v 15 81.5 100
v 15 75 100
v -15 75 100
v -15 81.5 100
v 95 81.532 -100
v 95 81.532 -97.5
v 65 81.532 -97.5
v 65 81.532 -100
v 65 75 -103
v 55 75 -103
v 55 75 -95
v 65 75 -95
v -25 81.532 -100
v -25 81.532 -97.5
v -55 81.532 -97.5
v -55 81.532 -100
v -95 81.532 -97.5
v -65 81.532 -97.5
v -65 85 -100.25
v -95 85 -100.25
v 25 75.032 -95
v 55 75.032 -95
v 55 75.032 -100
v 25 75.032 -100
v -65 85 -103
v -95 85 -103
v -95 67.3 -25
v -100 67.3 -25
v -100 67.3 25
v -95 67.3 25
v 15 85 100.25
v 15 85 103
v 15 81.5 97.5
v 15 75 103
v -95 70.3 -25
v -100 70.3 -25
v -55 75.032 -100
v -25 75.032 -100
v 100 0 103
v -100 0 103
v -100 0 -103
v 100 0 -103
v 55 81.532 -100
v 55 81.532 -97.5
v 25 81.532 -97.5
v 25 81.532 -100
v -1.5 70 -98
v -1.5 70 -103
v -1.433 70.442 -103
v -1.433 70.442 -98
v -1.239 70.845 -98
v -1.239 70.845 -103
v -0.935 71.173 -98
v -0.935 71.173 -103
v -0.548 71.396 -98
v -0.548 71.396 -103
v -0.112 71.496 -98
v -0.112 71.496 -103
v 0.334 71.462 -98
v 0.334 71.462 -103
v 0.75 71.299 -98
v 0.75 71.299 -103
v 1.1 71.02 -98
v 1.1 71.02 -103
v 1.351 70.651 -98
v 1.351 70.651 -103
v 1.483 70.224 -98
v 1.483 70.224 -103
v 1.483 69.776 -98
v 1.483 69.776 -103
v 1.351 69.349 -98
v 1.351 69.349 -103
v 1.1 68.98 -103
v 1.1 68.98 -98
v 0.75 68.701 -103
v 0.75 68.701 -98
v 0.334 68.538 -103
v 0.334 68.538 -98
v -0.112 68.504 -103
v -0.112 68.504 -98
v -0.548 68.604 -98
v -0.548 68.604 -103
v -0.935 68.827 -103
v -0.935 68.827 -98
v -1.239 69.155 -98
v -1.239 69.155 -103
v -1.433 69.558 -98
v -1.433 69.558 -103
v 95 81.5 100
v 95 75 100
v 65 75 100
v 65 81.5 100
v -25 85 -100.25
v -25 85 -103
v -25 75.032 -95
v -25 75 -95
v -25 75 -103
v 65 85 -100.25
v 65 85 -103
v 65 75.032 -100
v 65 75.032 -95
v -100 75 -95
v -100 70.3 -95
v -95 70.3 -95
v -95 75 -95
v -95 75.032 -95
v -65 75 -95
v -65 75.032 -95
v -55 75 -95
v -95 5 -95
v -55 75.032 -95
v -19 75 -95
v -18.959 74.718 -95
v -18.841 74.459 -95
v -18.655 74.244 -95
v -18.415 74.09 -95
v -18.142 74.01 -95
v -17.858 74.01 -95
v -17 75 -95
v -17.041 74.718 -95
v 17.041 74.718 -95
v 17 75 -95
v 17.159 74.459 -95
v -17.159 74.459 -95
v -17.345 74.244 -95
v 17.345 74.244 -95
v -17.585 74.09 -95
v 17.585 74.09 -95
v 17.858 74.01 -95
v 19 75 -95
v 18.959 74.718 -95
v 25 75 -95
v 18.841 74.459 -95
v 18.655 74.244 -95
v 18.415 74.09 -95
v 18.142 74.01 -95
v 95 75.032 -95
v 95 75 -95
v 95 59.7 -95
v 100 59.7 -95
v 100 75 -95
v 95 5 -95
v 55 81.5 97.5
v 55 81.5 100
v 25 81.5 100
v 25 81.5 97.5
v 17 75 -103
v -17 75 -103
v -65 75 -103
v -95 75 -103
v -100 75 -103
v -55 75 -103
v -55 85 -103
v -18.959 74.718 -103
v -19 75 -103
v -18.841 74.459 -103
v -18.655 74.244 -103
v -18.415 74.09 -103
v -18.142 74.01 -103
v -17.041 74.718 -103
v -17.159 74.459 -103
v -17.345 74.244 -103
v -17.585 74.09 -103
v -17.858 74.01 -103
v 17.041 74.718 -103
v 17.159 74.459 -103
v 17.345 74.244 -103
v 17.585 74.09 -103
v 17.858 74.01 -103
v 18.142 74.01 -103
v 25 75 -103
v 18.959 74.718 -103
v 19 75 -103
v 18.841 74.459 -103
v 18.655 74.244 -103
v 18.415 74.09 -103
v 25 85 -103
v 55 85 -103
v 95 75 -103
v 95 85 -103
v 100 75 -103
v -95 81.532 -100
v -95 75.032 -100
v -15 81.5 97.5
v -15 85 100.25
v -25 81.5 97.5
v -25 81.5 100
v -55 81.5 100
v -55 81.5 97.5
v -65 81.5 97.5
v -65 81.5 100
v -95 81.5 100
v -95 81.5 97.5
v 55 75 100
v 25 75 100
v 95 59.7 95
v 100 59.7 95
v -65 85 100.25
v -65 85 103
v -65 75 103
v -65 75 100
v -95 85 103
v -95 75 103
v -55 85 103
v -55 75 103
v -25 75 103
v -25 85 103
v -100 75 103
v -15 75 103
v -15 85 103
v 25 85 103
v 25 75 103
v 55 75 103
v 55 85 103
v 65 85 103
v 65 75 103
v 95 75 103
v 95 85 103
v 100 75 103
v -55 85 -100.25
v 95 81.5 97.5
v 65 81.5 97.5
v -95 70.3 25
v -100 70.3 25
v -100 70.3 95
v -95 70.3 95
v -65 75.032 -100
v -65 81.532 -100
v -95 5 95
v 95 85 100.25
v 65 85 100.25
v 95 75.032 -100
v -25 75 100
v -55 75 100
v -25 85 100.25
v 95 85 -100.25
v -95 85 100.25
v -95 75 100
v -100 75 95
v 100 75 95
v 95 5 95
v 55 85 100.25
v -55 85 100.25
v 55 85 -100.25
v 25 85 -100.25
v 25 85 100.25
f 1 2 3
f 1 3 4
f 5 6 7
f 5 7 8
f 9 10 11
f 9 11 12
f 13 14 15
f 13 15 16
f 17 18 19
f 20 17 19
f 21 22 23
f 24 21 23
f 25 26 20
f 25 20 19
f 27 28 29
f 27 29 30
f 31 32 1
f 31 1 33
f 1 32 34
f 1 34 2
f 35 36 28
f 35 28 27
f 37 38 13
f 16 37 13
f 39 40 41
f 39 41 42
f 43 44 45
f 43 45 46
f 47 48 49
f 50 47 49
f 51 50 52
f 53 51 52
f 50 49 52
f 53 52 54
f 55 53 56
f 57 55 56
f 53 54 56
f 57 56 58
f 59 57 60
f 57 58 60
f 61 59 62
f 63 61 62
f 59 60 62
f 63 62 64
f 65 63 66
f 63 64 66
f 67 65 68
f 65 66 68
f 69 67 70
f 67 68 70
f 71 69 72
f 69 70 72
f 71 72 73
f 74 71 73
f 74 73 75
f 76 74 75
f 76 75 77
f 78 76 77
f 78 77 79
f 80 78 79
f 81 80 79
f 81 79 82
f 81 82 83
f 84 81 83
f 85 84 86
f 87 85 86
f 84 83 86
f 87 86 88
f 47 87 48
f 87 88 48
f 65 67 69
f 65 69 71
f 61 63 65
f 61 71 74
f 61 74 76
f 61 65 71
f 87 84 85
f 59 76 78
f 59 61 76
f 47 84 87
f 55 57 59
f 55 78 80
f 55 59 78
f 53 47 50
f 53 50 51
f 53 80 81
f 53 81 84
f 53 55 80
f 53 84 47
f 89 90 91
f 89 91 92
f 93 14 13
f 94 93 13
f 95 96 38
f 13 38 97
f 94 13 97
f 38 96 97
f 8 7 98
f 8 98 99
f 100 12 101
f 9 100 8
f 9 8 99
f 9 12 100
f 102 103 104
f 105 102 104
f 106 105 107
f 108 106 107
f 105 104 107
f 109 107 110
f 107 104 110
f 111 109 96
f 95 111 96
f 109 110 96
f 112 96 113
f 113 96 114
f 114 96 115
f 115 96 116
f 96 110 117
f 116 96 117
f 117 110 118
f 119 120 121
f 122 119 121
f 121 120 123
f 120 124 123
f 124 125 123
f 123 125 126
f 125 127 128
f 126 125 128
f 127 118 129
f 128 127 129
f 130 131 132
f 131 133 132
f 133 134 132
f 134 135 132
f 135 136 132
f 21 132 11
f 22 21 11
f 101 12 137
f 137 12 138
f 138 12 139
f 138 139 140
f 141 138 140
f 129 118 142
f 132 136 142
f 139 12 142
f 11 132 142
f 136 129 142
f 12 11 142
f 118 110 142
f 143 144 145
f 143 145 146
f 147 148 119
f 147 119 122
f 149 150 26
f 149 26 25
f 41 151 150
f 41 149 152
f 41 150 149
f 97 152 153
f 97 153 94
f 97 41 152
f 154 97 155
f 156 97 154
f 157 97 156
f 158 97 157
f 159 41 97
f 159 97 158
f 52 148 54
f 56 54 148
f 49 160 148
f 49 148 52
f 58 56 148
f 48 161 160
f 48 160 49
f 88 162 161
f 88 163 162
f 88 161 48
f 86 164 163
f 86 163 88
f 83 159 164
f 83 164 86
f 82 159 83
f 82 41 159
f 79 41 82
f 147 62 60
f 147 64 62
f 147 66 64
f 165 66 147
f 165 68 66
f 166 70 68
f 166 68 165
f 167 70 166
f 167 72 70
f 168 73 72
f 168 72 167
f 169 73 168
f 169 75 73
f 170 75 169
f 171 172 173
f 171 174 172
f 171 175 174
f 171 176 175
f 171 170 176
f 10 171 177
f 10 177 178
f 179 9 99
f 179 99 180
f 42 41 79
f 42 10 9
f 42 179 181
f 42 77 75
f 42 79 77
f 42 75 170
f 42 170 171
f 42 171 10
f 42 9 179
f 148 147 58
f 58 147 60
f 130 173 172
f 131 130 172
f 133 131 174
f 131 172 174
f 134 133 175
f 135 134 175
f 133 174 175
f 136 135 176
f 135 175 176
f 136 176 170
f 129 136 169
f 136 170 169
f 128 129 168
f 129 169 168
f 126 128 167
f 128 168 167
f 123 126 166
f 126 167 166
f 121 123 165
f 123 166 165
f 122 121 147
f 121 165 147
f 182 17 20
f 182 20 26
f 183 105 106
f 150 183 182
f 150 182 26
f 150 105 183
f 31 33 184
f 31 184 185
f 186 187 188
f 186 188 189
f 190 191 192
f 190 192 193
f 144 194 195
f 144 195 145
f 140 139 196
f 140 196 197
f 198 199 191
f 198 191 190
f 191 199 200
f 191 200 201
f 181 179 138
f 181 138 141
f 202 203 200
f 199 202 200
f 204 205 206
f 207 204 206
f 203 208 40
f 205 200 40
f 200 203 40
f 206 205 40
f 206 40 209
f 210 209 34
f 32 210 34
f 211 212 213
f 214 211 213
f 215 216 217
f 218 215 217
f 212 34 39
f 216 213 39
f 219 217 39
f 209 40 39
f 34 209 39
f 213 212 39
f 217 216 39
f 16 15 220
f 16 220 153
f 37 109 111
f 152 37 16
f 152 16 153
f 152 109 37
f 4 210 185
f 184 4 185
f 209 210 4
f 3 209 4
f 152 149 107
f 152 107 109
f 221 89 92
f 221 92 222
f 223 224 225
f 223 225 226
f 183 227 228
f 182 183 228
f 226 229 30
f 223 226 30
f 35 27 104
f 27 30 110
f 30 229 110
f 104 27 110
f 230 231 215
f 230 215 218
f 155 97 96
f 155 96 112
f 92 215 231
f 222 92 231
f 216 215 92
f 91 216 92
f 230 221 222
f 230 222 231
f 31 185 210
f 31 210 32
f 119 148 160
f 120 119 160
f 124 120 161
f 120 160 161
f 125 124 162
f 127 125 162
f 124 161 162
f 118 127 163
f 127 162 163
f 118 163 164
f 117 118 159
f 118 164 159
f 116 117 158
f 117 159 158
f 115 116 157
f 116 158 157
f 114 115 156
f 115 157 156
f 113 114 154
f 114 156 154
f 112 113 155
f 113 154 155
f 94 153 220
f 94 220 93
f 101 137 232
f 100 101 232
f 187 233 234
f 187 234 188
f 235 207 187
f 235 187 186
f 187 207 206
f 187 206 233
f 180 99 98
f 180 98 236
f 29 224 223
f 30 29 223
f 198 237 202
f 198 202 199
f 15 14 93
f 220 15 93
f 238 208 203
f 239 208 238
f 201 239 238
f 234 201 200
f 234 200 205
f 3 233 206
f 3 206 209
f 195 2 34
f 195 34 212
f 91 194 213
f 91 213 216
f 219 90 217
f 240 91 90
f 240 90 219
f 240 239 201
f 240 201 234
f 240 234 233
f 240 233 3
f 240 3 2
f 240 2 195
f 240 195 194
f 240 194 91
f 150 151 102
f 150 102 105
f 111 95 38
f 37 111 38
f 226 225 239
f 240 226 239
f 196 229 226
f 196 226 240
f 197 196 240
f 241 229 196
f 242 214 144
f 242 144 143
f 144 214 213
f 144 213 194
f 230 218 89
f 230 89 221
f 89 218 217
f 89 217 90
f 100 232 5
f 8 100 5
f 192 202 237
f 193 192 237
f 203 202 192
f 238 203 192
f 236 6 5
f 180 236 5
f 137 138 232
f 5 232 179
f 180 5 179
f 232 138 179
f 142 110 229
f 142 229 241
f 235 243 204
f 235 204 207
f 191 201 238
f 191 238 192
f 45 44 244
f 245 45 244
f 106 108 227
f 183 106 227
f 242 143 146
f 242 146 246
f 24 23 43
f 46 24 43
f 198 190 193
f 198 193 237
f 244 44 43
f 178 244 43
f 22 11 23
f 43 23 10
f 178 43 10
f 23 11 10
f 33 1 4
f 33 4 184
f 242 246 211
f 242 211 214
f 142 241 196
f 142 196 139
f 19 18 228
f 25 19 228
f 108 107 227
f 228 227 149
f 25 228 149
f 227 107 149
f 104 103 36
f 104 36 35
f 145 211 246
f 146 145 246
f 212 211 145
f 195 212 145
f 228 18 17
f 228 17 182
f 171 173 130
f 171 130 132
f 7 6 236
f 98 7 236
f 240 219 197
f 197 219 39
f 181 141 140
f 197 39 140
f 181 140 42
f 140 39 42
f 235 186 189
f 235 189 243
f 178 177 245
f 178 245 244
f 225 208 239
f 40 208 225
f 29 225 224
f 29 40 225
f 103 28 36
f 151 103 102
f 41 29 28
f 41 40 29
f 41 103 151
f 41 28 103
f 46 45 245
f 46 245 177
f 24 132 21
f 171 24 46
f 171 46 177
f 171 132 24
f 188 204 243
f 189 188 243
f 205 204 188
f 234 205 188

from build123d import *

# Parameters (mm, degrees)
SKETCH_1_W               = 200
SKETCH_1_H               = 206
EXTRUDE_2_DEPTH          = 5
SKETCH_2_W               = 200
SKETCH_2_H               = 8
EXTRUDE_3_DEPTH          = 70
SKETCH_3_W               = 5
SKETCH_3_H               = 190
EXTRUDE_4_DEPTH          = 54.7
SKETCH_4_W               = 200
SKETCH_4_H               = 8
EXTRUDE_5_DEPTH          = 70
SKETCH_14_W              = 5
SKETCH_14_H              = 190
EXTRUDE_7_DEPTH          = 65.3
SKETCH_15_W              = 5
SKETCH_15_H              = 50
CUT_EXTRUDE_7_DEPTH      = 3
CUT_EXTRUDE_8_DEPTH      = 1
CUT_EXTRUDE_8_DEPTH_BACK = 8
CUT_EXTRUDE_9_DEPTH      = 1
CUT_EXTRUDE_9_DEPTH_BACK = 8
SKETCH_19_R              = 1.5
CUT_EXTRUDE_10_DEPTH     = 5
SKETCH_21_W              = 30
SKETCH_21_H              = 8
EXTRUDE_8_DEPTH          = 10
SKETCH_24_W              = 5
SKETCH_24_H              = 6.5
CUT_EXTRUDE_11_DEPTH     = 196
SKETCH_25_W              = 2.5
SKETCH_25_H              = 3.5
CUT_EXTRUDE_12_DEPTH     = 196
CUT_EXTRUDE_13_DEPTH     = 196
SKETCH_27_W              = 5
SKETCH_27_H              = 6.5
CUT_EXTRUDE_14_DEPTH     = 196
SKETCH_28_W              = 2.5
SKETCH_28_H              = 3.467533866
CUT_EXTRUDE_15_DEPTH     = 196
CUT_EXTRUDE_16_DEPTH     = 196


with BuildPart() as part:
    # Эскиз1 → Бобышка-Вытянуть2 (new body)
    with BuildSketch(Plane(origin=(0, 0, 0), x_dir=(1, 0, 0), z_dir=(0, 1, 0))):
        Rectangle(SKETCH_1_W, SKETCH_1_H)
    extrude(amount=EXTRUDE_2_DEPTH)

    # Эскиз2 → Бобышка-Вытянуть3 (add)
    with BuildSketch(Plane(origin=(0, 5, 0), x_dir=(1, 0, 0), z_dir=(0, 1, 0))):
        with Locations((0, -99)):
            Rectangle(SKETCH_2_W, SKETCH_2_H)
    extrude(amount=EXTRUDE_3_DEPTH)

    # Эскиз3 → Бобышка-Вытянуть4 (add)
    with BuildSketch(Plane(origin=(0, 5, 0), x_dir=(1, 0, 0), z_dir=(0, 1, 0))):
        with Locations((97.5, 0)):
            Rectangle(SKETCH_3_W, SKETCH_3_H)
    extrude(amount=EXTRUDE_4_DEPTH)

    # Эскиз4 → Бобышка-Вытянуть5 (add)
    with BuildSketch(Plane(origin=(0, 5, 0), x_dir=(1, 0, 0), z_dir=(0, 1, 0))):
        with Locations((0, 99)):
            Rectangle(SKETCH_4_W, SKETCH_4_H)
    extrude(amount=EXTRUDE_5_DEPTH)

    # Эскиз14 → Бобышка-Вытянуть7 (add)
    with BuildSketch(Plane(origin=(0, 5, 0), x_dir=(1, 0, 0), z_dir=(0, 1, 0))):
        with Locations((-97.5, 0)):
            Rectangle(SKETCH_14_W, SKETCH_14_H)
    extrude(amount=EXTRUDE_7_DEPTH)

    # Эскиз15 → Вырез-Вытянуть7 (cut)
    with BuildSketch(Plane(origin=(0, 70.3, 0), x_dir=(1, 0, 0), z_dir=(0, 1, 0))):
        with Locations((-97.5, 0)):
            Rectangle(SKETCH_15_W, SKETCH_15_H)
    extrude(amount=-CUT_EXTRUDE_7_DEPTH, mode=Mode.SUBTRACT)

    # Эскиз16 → Вырез-Вытянуть8 (cut, two sides)
    with BuildSketch(Plane(origin=(0, 0, -103), x_dir=(-1, 0, 0), z_dir=(0, 0, -1))) as cut_extrude_8_sk:
        with BuildLine():
            Line((-19, 366.325434328), (-19, 75))
            ThreePointArc((-19, 75), (-18, 74), (-17, 75))
            Line((-17, 75), (-17, 366.325434328))
            Line((-17, 366.325434328), (-17, 948.976302985))
            Line((-17, 948.976302985), (-19, 948.976302985))
            Line((-19, 948.976302985), (-19, 366.325434328))
        make_face()
    extrude(amount=CUT_EXTRUDE_8_DEPTH, mode=Mode.SUBTRACT)
    extrude(cut_extrude_8_sk.sketch, amount=-CUT_EXTRUDE_8_DEPTH_BACK, mode=Mode.SUBTRACT)

    # Эскиз18 → Вырез-Вытянуть9 (cut, two sides)
    with BuildSketch(Plane(origin=(0, 0, -103), x_dir=(-1, 0, 0), z_dir=(0, 0, -1))) as cut_extrude_9_sk:
        with BuildLine():
            Line((17, 366.325434328), (17, 75))
            ThreePointArc((17, 75), (18, 74), (19, 75))
            Line((19, 75), (19, 366.325434328))
            Line((19, 366.325434328), (19, 948.976302985))
            Line((19, 948.976302985), (17, 948.976302985))
            Line((17, 948.976302985), (17, 366.325434328))
        make_face()
    extrude(amount=CUT_EXTRUDE_9_DEPTH, mode=Mode.SUBTRACT)
    extrude(cut_extrude_9_sk.sketch, amount=-CUT_EXTRUDE_9_DEPTH_BACK, mode=Mode.SUBTRACT)

    # Эскиз19 → Вырез-Вытянуть10 (cut)
    with BuildSketch(Plane(origin=(0, 0, -103), x_dir=(-1, 0, 0), z_dir=(0, 0, -1))):
        with Locations((0, 70)):
            Circle(SKETCH_19_R)
    extrude(amount=-CUT_EXTRUDE_10_DEPTH, mode=Mode.SUBTRACT)

    # Эскиз21 → Бобышка-Вытянуть8 (add)
    with BuildSketch(Plane(origin=(0, 75, 0), x_dir=(1, 0, 0), z_dir=(0, 1, 0))):
        with Locations((-80, -99)):
            Rectangle(SKETCH_21_W, SKETCH_21_H)
        with Locations((-40, -99)):
            Rectangle(SKETCH_21_W, SKETCH_21_H)
        with Locations((0, -99)):
            Rectangle(SKETCH_21_W, SKETCH_21_H)
        with Locations((40, -99)):
            Rectangle(SKETCH_21_W, SKETCH_21_H)
        with Locations((80, -99)):
            Rectangle(SKETCH_21_W, SKETCH_21_H)
        with Locations((80, 99)):
            Rectangle(SKETCH_21_W, SKETCH_21_H)
        with Locations((40, 99)):
            Rectangle(SKETCH_21_W, SKETCH_21_H)
        with Locations((-40, 99)):
            Rectangle(SKETCH_21_W, SKETCH_21_H)
        with Locations((-80, 99)):
            Rectangle(SKETCH_21_W, SKETCH_21_H)
    extrude(amount=EXTRUDE_8_DEPTH)

    # Эскиз24 → Вырез-Вытянуть11 (cut, through all)
    with BuildSketch(Plane(origin=(95, 0, 0), x_dir=(0, 0, -1), z_dir=(1, 0, 0))):
        with Locations((-97.5, 78.25)):
            Rectangle(SKETCH_24_W, SKETCH_24_H)
    extrude(amount=-CUT_EXTRUDE_11_DEPTH, mode=Mode.SUBTRACT)

    # Эскиз25 → Вырез-Вытянуть12 (cut, through all)
    with BuildSketch(Plane(origin=(95, 0, 0), x_dir=(0, 0, -1), z_dir=(1, 0, 0))):
        with Locations((-96.25, 83.25)):
            Rectangle(SKETCH_25_W, SKETCH_25_H)
    extrude(amount=-CUT_EXTRUDE_12_DEPTH, mode=Mode.SUBTRACT)

    # Эскиз26 → Вырез-Вытянуть13 (cut, through all)
    with BuildSketch(Plane(origin=(95, 0, 0), x_dir=(0, 0, -1), z_dir=(1, 0, 0))):
        Polygon((-97.5, 81.5), (-100.25, 85), (-97.5, 85), align=None)
    extrude(amount=-CUT_EXTRUDE_13_DEPTH, mode=Mode.SUBTRACT)

    # Эскиз27 → Вырез-Вытянуть14 (cut, through all)
    with BuildSketch(Plane(origin=(95, 0, 0), x_dir=(0, 0, -1), z_dir=(1, 0, 0))):
        with Locations((97.5, 78.282466134)):
            Rectangle(SKETCH_27_W, SKETCH_27_H)
    extrude(amount=-CUT_EXTRUDE_14_DEPTH, mode=Mode.SUBTRACT)

    # Эскиз28 → Вырез-Вытянуть15 (cut, through all)
    with BuildSketch(Plane(origin=(95, 0, 0), x_dir=(0, 0, -1), z_dir=(1, 0, 0))):
        with Locations((96.25, 83.266233067)):
            Rectangle(SKETCH_28_W, SKETCH_28_H)
    extrude(amount=-CUT_EXTRUDE_15_DEPTH, mode=Mode.SUBTRACT)

    # Эскиз29 → Вырез-Вытянуть16 (cut, through all)
    with BuildSketch(Plane(origin=(95, 0, 0), x_dir=(0, 0, -1), z_dir=(1, 0, 0))):
        Polygon((97.5, 81.532466134), (100.25, 85), (97.5, 85), align=None)
    extrude(amount=-CUT_EXTRUDE_16_DEPTH, mode=Mode.SUBTRACT)


solid = part.part
